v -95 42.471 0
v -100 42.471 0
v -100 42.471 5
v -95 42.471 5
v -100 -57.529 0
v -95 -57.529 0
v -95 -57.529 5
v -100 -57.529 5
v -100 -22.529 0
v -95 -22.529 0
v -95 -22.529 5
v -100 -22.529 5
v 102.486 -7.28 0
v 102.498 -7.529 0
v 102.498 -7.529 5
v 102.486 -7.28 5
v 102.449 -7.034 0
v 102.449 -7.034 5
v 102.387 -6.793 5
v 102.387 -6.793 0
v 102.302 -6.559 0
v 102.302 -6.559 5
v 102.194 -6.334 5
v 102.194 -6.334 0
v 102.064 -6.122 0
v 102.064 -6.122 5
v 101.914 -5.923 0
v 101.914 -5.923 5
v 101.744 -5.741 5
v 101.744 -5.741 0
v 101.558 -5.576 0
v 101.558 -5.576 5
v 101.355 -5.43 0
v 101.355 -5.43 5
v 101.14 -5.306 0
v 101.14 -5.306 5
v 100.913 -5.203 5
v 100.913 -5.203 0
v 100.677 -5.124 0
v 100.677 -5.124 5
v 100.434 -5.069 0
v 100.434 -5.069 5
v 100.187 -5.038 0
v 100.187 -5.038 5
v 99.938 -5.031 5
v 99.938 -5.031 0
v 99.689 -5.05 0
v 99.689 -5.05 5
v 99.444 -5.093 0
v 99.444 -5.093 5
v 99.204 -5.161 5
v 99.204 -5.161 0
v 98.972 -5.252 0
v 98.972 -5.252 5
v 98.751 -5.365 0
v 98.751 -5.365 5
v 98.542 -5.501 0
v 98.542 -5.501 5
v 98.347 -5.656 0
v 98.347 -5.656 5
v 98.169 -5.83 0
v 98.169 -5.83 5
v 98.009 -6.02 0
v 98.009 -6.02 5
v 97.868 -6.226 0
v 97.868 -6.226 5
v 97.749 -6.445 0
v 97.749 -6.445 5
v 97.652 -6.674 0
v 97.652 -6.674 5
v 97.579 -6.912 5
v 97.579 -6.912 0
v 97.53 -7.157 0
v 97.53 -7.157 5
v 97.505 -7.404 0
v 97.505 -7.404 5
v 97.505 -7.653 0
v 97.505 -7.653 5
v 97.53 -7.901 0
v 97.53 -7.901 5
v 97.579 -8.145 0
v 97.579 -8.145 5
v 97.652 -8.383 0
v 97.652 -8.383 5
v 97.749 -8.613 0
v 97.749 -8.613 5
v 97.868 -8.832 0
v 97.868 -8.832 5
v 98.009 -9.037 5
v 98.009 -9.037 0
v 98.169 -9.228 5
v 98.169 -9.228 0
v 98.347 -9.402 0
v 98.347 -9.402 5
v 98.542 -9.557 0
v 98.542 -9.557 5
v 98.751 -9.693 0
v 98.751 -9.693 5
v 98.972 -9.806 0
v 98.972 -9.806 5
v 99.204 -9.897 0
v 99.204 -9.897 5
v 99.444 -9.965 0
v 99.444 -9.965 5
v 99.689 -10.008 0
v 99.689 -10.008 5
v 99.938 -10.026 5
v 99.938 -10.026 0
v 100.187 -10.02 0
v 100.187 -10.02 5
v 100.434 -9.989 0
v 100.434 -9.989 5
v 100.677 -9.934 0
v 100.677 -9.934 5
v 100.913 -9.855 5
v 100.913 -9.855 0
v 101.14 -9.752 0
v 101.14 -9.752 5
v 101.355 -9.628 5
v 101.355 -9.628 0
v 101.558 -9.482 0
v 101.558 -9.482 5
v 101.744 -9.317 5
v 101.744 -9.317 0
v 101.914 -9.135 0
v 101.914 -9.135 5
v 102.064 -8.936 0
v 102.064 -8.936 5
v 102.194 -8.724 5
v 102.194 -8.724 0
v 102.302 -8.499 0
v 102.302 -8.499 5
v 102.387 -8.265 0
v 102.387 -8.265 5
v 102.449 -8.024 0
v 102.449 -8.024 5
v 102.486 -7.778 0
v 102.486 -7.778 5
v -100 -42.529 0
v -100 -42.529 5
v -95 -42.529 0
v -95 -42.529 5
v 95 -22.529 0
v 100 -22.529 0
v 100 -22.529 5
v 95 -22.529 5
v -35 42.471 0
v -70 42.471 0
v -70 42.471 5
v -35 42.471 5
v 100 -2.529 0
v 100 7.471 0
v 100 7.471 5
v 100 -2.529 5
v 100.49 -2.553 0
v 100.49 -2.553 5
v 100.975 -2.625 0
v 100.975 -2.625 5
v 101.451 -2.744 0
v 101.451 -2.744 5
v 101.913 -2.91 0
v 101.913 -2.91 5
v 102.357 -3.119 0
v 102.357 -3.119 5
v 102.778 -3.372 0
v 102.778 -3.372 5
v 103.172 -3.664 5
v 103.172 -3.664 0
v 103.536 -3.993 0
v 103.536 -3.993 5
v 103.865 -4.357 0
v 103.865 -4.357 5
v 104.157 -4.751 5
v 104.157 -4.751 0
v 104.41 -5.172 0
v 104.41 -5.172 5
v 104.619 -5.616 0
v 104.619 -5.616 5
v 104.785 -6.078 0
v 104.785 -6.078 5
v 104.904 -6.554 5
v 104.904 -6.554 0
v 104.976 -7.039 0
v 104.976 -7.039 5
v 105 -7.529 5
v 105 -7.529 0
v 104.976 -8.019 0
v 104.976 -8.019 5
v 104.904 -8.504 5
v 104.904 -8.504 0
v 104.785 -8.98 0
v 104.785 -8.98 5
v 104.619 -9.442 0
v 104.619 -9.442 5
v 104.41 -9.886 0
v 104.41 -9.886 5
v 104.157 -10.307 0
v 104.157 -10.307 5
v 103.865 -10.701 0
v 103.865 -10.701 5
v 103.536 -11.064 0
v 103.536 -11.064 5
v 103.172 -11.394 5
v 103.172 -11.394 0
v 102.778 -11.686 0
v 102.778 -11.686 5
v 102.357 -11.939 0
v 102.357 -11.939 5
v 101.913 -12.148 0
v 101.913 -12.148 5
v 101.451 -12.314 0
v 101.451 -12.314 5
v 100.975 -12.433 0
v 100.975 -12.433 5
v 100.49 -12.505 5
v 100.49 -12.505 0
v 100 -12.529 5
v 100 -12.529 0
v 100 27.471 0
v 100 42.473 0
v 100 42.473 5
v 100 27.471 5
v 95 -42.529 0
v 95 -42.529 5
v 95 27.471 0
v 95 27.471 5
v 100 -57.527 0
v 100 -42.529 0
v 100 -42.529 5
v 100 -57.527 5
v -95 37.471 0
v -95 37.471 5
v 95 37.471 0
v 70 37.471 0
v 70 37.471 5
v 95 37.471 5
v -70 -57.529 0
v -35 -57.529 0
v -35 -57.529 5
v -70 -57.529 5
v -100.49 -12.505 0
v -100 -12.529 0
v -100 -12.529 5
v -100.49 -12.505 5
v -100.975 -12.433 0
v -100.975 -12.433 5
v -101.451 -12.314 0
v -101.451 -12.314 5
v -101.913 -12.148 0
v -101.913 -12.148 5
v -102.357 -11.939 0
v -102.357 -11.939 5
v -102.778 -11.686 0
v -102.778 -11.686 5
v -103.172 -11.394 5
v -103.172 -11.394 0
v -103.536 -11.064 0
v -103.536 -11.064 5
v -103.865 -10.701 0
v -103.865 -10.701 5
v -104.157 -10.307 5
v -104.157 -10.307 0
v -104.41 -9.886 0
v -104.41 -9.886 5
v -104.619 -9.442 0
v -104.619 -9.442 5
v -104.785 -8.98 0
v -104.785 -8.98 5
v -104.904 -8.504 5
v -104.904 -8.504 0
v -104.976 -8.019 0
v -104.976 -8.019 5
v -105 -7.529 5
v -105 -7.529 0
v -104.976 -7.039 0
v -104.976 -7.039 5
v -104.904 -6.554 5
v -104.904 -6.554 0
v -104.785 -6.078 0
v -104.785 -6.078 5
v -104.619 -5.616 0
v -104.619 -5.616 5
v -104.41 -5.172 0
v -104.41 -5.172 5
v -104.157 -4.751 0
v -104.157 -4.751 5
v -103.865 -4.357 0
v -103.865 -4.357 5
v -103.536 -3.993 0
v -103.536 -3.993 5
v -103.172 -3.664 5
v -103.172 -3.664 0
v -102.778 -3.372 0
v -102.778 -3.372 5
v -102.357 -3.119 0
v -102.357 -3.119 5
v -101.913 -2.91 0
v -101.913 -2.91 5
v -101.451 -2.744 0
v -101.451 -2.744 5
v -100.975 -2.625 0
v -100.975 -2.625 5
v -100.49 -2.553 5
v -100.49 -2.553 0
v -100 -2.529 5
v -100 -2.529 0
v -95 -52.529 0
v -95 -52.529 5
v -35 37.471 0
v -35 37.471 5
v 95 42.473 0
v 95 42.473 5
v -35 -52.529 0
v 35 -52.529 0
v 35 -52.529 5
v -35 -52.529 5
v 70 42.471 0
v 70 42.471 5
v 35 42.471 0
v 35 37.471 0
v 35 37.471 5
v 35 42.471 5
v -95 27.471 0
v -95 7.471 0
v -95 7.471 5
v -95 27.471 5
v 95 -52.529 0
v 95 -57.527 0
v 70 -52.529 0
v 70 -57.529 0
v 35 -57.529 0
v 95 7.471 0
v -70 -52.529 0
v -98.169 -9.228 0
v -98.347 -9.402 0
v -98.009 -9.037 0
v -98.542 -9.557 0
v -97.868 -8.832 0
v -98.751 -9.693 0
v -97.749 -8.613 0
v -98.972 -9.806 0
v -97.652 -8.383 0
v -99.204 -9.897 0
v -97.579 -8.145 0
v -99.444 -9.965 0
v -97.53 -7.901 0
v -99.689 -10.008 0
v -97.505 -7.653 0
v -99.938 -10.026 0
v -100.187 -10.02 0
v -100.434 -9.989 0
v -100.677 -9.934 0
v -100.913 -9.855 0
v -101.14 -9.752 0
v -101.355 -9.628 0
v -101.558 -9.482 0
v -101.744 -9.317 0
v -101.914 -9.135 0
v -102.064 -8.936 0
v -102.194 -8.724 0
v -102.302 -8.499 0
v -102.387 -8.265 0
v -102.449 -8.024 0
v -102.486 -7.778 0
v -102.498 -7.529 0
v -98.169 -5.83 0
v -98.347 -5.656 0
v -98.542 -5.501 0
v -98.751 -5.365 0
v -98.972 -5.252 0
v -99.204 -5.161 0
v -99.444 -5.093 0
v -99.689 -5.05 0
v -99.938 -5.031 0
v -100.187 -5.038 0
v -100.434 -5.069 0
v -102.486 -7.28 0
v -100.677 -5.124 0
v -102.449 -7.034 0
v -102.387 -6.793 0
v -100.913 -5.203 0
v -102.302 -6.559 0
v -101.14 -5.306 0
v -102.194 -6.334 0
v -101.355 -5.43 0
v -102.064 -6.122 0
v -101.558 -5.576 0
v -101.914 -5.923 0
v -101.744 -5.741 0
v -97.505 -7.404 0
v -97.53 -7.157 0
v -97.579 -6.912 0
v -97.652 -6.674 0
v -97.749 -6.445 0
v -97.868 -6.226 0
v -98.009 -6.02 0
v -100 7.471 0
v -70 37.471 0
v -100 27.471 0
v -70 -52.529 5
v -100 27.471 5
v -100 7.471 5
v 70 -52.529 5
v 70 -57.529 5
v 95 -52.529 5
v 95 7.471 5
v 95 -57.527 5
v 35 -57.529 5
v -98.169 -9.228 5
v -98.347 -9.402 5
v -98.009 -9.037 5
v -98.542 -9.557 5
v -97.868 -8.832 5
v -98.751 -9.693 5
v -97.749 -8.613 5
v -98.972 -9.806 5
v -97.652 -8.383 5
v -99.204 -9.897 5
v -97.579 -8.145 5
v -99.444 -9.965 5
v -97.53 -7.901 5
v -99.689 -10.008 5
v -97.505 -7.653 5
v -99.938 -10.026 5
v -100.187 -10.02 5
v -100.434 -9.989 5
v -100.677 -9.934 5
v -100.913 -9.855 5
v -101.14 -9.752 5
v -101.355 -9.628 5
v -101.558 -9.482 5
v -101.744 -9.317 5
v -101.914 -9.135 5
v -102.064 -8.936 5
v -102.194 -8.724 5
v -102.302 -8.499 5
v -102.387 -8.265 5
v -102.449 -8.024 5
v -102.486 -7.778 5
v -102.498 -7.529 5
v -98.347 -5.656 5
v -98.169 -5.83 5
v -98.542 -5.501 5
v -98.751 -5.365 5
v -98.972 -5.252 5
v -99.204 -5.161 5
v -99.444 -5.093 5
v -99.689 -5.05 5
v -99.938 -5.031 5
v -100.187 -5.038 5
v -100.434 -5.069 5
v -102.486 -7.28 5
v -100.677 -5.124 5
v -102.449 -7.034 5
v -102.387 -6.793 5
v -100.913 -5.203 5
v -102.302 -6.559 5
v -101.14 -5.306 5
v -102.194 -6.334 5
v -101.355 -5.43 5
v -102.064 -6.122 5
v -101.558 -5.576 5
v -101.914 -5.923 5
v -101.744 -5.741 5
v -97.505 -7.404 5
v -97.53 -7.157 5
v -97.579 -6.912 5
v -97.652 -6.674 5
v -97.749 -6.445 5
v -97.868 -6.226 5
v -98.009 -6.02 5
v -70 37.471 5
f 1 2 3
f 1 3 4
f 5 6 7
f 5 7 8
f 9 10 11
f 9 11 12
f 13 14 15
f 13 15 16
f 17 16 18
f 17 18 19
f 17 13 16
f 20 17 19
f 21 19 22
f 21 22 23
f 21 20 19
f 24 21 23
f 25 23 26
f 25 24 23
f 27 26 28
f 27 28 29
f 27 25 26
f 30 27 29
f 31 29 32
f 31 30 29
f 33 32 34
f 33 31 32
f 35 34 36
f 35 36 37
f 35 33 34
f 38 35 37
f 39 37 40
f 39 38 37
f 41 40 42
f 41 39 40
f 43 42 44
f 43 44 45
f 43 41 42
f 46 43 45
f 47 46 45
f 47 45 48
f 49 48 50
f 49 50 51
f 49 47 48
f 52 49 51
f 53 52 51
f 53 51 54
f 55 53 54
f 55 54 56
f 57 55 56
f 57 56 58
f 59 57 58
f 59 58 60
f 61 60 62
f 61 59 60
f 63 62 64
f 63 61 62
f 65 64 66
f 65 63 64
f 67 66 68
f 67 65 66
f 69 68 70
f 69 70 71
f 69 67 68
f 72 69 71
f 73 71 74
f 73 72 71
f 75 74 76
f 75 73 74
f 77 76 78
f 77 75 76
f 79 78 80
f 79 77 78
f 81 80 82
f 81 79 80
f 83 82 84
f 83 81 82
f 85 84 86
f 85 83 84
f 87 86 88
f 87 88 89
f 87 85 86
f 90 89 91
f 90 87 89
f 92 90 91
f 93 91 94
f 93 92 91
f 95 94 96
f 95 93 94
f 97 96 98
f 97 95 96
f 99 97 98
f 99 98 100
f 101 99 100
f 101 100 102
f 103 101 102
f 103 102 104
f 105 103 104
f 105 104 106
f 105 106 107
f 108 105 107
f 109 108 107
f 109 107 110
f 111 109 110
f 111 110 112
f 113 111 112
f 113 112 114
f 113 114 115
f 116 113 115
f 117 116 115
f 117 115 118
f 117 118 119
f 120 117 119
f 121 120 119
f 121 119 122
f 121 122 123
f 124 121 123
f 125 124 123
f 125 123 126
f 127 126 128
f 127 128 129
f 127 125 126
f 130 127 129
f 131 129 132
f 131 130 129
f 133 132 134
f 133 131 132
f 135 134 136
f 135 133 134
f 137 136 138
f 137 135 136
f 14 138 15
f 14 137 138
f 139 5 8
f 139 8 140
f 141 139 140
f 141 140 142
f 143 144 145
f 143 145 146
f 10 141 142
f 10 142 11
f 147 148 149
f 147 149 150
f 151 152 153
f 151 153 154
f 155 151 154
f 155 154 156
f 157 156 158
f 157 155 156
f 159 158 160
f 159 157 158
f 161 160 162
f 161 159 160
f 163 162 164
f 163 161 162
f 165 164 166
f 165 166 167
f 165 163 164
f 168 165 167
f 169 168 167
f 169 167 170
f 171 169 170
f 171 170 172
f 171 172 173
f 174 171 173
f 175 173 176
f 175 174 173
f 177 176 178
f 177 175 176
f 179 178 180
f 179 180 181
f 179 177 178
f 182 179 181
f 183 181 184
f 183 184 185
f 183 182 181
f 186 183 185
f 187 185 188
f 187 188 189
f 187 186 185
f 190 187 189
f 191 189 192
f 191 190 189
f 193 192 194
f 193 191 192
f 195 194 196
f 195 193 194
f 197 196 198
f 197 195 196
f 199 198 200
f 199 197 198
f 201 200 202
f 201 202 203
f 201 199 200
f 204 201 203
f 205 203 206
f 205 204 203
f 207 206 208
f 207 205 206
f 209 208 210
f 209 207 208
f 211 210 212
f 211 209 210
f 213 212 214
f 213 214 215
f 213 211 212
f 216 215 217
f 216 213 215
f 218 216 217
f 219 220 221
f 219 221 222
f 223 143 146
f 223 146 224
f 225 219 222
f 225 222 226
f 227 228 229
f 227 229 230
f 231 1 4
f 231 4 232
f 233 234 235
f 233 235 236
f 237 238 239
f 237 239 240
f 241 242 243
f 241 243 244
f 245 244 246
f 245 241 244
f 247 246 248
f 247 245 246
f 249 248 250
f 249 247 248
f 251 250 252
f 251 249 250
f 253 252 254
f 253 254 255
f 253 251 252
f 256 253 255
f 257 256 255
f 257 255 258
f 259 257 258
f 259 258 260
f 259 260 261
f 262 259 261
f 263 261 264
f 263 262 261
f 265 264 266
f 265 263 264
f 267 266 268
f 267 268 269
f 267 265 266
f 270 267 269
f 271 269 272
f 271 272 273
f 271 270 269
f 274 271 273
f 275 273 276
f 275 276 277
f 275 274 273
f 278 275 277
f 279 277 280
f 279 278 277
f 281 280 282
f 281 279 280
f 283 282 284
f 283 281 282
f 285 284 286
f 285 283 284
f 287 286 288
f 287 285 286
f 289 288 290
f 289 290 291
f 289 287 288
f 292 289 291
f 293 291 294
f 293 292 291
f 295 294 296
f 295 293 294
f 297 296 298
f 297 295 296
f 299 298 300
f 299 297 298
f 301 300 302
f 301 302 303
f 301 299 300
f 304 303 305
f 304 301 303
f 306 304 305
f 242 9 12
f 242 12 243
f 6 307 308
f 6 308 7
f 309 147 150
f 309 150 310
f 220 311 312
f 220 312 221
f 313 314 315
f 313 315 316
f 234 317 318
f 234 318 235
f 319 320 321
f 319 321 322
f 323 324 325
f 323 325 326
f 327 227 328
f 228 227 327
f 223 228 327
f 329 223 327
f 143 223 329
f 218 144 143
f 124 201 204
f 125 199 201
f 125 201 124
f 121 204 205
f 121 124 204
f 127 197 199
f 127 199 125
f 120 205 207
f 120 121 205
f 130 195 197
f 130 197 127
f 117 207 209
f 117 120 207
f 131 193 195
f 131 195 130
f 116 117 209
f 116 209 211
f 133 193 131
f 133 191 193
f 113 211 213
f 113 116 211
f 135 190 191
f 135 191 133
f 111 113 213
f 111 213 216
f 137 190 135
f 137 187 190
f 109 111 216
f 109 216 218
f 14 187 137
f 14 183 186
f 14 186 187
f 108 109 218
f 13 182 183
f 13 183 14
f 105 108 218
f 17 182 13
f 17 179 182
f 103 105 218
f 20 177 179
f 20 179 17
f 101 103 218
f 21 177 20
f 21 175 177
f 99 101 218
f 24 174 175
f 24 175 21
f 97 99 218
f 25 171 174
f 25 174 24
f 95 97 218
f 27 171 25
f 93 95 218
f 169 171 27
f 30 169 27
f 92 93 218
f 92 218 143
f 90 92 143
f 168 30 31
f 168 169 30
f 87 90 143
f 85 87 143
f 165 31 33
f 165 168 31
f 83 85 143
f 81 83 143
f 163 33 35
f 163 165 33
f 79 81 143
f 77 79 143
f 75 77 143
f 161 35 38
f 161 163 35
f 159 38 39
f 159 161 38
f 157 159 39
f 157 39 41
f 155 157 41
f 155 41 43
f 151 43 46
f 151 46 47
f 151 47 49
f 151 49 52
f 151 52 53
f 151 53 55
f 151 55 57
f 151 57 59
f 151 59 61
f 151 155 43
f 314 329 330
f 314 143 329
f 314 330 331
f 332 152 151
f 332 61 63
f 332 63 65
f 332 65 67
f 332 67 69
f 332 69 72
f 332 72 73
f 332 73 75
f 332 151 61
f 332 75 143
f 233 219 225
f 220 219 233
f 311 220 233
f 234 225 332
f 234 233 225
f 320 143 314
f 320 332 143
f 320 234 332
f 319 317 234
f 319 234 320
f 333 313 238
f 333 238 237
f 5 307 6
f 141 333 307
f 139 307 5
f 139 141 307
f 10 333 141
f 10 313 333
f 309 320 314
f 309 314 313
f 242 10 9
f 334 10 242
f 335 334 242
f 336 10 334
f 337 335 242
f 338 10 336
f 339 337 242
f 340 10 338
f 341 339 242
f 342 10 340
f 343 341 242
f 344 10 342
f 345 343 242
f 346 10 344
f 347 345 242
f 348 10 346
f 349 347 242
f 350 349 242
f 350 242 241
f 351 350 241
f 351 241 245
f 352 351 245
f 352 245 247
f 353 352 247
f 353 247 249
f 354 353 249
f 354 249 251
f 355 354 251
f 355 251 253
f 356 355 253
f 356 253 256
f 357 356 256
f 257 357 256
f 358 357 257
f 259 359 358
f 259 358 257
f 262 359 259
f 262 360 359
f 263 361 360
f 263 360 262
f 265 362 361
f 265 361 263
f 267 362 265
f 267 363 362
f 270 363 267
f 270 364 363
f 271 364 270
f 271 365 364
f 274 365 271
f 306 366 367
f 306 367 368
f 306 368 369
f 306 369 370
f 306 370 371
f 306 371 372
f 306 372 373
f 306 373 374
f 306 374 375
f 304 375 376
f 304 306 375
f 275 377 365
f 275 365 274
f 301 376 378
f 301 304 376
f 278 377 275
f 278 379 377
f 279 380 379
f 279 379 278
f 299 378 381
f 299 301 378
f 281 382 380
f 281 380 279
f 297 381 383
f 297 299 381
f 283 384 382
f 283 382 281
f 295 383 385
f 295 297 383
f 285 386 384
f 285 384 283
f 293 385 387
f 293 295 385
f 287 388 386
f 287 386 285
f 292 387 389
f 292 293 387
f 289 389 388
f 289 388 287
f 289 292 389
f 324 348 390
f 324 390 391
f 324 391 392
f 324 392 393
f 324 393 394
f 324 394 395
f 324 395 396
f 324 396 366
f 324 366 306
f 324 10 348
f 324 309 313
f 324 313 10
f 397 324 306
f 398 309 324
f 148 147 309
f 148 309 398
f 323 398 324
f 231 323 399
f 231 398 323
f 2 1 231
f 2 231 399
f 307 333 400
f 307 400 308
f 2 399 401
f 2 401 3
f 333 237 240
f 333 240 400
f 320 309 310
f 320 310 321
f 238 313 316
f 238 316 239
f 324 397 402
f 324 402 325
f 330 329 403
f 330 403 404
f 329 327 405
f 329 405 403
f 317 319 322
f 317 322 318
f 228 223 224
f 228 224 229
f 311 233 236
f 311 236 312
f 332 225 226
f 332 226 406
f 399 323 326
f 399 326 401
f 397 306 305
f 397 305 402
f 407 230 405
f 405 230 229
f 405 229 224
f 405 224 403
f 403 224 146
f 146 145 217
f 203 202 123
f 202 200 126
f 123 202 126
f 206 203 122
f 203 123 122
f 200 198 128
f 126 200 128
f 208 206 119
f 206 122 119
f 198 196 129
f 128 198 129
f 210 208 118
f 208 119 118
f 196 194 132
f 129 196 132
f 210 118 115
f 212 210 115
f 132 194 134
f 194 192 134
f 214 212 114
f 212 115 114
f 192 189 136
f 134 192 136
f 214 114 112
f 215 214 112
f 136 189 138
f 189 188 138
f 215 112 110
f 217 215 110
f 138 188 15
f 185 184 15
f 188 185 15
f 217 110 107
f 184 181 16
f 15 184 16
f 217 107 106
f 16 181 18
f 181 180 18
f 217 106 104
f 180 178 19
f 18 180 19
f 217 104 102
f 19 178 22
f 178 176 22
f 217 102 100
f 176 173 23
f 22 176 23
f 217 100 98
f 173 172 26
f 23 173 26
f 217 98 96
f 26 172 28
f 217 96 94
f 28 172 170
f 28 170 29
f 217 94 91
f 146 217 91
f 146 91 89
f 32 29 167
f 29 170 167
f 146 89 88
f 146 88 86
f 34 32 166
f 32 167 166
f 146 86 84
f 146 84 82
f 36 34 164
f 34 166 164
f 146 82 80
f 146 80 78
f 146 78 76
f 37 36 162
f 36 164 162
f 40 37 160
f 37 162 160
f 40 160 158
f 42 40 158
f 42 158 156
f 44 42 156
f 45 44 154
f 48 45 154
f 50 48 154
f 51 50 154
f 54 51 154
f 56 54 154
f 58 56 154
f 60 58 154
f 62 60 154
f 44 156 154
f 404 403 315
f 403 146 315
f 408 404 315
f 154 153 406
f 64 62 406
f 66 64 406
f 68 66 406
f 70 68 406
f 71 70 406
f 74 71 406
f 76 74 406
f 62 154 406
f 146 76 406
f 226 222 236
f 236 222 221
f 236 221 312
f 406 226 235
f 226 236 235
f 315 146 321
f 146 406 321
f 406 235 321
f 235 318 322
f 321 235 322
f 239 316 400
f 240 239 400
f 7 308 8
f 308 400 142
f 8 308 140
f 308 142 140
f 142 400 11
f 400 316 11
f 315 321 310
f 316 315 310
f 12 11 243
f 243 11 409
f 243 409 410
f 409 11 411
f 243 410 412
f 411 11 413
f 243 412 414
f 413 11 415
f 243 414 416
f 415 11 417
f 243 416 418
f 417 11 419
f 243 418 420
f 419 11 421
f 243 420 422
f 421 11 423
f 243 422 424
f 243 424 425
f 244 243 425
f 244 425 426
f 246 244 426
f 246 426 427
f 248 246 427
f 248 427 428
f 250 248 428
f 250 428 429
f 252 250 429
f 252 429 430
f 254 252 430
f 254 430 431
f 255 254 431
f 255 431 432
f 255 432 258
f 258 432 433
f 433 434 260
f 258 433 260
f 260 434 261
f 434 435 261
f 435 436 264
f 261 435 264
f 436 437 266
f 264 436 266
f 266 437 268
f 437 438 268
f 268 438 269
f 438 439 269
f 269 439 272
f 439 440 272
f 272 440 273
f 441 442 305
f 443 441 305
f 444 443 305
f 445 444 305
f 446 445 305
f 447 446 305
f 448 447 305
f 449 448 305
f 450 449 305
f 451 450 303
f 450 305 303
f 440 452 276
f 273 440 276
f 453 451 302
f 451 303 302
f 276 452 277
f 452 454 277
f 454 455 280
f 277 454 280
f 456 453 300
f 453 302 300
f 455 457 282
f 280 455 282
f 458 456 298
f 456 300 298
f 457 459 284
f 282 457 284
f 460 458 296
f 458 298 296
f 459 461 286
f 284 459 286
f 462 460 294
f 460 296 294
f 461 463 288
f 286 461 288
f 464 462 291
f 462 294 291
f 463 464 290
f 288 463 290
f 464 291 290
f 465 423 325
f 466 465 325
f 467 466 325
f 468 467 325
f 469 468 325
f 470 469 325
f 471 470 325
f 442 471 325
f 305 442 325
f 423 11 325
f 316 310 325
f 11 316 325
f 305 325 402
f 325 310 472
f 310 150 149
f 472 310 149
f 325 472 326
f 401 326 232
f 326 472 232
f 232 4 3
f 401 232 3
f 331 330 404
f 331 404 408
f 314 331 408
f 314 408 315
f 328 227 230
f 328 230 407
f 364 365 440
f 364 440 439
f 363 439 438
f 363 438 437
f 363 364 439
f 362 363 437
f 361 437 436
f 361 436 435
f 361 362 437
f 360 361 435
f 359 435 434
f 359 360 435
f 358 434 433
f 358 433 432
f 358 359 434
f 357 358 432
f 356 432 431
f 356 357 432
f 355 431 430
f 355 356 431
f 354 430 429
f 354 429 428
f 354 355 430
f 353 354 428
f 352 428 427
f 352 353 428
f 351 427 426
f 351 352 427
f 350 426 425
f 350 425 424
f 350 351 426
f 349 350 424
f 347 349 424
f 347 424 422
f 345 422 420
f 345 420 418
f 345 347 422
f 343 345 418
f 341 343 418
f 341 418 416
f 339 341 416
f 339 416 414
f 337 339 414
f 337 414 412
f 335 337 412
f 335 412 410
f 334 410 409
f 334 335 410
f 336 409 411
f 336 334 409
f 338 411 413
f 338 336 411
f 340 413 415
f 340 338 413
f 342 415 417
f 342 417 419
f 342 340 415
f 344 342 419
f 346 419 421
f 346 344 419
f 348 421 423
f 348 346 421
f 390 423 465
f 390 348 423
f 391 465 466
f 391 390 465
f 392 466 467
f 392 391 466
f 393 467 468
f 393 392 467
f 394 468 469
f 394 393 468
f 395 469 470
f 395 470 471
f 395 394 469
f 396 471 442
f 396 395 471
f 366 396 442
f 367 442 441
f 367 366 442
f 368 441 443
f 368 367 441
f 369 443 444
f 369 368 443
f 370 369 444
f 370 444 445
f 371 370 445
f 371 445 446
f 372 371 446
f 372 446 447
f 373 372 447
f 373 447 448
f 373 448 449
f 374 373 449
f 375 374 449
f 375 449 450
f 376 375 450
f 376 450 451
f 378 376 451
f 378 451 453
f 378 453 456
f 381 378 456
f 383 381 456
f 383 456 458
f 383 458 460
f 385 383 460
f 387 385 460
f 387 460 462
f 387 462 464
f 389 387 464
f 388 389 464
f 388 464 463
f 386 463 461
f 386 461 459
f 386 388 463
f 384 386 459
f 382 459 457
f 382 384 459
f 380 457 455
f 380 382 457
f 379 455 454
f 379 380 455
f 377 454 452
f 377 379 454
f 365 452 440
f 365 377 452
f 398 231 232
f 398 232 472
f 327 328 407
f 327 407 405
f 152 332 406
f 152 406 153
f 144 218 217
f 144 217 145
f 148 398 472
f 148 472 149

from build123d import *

# Parameters (mm, degrees)
ESQUISSE1_R        = 2.498275285
BOSS_EXTRU_1_DEPTH = 5


with BuildPart() as part:
    # Esquisse1 → Boss.-Extru.1 (new body)
    with BuildSketch(Plane.XY):
        with BuildLine():
            Line((-35, 37.471042471), (35, 37.471042471))
            Line((35, 37.471042471), (35, 42.471042471))
            Line((35, 42.471042471), (70, 42.471042471))
            Line((70, 42.471042471), (70, 37.471042471))
            Line((70, 37.471042471), (95, 37.471042471))
            Line((95, 37.471042471), (95, 42.472767186))
            Line((95, 42.472767186), (100, 42.472767186))
            Line((100, 42.472767186), (100, 37.471042471))
            Line((100, 37.471042471), (100, 27.471042471))
            Line((100, 27.471042471), (95, 27.471042471))
            Line((95, 27.471042471), (95, 7.471042471))
            Line((95, 7.471042471), (100, 7.471042471))
            Line((100, 7.471042471), (100, -2.528957529))
            ThreePointArc((100, -2.528957529), (105, -7.528957529), (100, -12.528957529))
            Line((100, -12.528957529), (100, -22.528957529))
            Line((100, -22.528957529), (95, -22.528957529))
            Line((95, -22.528957529), (95, -42.528957529))
            Line((95, -42.528957529), (100, -42.528957529))
            Line((100, -42.528957529), (100, -52.528957529))
            Line((100, -52.528957529), (100, -57.527232814))
            Line((100, -57.527232814), (95, -57.527232814))
            Line((95, -57.527232814), (95, -52.528957529))
            Line((95, -52.528957529), (70, -52.528957529))
            Line((70, -52.528957529), (70, -57.528957529))
            Line((70, -57.528957529), (35, -57.528957529))
            Line((35, -57.528957529), (35, -52.528957529))
            Line((35, -52.528957529), (-35, -52.528957529))
            Line((-35, -52.528957529), (-35, -57.528957529))
            Line((-35, -57.528957529), (-70, -57.528957529))
            Line((-70, -57.528957529), (-70, -52.528957529))
            Line((-70, -52.528957529), (-95, -52.528957529))
            Line((-95, -52.528957529), (-95, -57.528957529))
            Line((-95, -57.528957529), (-100, -57.528957529))
            Line((-100, -57.528957529), (-100, -52.528957529))
            Line((-100, -52.528957529), (-100, -42.528957529))
            Line((-100, -42.528957529), (-95, -42.528957529))
            Line((-95, -42.528957529), (-95, -22.528957529))
            Line((-95, -22.528957529), (-100, -22.528957529))
            Line((-100, -22.528957529), (-100, -12.528957529))
            ThreePointArc((-100, -12.528957529), (-105, -7.528957529), (-100, -2.528957529))
            Line((-100, -2.528957529), (-100, 7.471042471))
            Line((-100, 7.471042471), (-95, 7.471042471))
            Line((-95, 7.471042471), (-95, 27.471042471))
            Line((-95, 27.471042471), (-100, 27.471042471))
            Line((-100, 27.471042471), (-100, 37.471042471))
            Line((-100, 37.471042471), (-100, 42.471042471))
            Line((-100, 42.471042471), (-95, 42.471042471))
            Line((-95, 42.471042471), (-95, 37.471042471))
            Line((-95, 37.471042471), (-70, 37.471042471))
            Line((-70, 37.471042471), (-70, 42.471042471))
            Line((-70, 42.471042471), (-35, 42.471042471))
            Line((-35, 42.471042471), (-35, 37.471042471))
        make_face()
        with Locations((100, -7.528957529)):
            Circle(ESQUISSE1_R, mode=Mode.SUBTRACT)
        with Locations(Location((-100, -7.528957529, 0), (0, 0, 180))):
            Circle(ESQUISSE1_R, mode=Mode.SUBTRACT)
    extrude(amount=BOSS_EXTRU_1_DEPTH)


solid = part.part
